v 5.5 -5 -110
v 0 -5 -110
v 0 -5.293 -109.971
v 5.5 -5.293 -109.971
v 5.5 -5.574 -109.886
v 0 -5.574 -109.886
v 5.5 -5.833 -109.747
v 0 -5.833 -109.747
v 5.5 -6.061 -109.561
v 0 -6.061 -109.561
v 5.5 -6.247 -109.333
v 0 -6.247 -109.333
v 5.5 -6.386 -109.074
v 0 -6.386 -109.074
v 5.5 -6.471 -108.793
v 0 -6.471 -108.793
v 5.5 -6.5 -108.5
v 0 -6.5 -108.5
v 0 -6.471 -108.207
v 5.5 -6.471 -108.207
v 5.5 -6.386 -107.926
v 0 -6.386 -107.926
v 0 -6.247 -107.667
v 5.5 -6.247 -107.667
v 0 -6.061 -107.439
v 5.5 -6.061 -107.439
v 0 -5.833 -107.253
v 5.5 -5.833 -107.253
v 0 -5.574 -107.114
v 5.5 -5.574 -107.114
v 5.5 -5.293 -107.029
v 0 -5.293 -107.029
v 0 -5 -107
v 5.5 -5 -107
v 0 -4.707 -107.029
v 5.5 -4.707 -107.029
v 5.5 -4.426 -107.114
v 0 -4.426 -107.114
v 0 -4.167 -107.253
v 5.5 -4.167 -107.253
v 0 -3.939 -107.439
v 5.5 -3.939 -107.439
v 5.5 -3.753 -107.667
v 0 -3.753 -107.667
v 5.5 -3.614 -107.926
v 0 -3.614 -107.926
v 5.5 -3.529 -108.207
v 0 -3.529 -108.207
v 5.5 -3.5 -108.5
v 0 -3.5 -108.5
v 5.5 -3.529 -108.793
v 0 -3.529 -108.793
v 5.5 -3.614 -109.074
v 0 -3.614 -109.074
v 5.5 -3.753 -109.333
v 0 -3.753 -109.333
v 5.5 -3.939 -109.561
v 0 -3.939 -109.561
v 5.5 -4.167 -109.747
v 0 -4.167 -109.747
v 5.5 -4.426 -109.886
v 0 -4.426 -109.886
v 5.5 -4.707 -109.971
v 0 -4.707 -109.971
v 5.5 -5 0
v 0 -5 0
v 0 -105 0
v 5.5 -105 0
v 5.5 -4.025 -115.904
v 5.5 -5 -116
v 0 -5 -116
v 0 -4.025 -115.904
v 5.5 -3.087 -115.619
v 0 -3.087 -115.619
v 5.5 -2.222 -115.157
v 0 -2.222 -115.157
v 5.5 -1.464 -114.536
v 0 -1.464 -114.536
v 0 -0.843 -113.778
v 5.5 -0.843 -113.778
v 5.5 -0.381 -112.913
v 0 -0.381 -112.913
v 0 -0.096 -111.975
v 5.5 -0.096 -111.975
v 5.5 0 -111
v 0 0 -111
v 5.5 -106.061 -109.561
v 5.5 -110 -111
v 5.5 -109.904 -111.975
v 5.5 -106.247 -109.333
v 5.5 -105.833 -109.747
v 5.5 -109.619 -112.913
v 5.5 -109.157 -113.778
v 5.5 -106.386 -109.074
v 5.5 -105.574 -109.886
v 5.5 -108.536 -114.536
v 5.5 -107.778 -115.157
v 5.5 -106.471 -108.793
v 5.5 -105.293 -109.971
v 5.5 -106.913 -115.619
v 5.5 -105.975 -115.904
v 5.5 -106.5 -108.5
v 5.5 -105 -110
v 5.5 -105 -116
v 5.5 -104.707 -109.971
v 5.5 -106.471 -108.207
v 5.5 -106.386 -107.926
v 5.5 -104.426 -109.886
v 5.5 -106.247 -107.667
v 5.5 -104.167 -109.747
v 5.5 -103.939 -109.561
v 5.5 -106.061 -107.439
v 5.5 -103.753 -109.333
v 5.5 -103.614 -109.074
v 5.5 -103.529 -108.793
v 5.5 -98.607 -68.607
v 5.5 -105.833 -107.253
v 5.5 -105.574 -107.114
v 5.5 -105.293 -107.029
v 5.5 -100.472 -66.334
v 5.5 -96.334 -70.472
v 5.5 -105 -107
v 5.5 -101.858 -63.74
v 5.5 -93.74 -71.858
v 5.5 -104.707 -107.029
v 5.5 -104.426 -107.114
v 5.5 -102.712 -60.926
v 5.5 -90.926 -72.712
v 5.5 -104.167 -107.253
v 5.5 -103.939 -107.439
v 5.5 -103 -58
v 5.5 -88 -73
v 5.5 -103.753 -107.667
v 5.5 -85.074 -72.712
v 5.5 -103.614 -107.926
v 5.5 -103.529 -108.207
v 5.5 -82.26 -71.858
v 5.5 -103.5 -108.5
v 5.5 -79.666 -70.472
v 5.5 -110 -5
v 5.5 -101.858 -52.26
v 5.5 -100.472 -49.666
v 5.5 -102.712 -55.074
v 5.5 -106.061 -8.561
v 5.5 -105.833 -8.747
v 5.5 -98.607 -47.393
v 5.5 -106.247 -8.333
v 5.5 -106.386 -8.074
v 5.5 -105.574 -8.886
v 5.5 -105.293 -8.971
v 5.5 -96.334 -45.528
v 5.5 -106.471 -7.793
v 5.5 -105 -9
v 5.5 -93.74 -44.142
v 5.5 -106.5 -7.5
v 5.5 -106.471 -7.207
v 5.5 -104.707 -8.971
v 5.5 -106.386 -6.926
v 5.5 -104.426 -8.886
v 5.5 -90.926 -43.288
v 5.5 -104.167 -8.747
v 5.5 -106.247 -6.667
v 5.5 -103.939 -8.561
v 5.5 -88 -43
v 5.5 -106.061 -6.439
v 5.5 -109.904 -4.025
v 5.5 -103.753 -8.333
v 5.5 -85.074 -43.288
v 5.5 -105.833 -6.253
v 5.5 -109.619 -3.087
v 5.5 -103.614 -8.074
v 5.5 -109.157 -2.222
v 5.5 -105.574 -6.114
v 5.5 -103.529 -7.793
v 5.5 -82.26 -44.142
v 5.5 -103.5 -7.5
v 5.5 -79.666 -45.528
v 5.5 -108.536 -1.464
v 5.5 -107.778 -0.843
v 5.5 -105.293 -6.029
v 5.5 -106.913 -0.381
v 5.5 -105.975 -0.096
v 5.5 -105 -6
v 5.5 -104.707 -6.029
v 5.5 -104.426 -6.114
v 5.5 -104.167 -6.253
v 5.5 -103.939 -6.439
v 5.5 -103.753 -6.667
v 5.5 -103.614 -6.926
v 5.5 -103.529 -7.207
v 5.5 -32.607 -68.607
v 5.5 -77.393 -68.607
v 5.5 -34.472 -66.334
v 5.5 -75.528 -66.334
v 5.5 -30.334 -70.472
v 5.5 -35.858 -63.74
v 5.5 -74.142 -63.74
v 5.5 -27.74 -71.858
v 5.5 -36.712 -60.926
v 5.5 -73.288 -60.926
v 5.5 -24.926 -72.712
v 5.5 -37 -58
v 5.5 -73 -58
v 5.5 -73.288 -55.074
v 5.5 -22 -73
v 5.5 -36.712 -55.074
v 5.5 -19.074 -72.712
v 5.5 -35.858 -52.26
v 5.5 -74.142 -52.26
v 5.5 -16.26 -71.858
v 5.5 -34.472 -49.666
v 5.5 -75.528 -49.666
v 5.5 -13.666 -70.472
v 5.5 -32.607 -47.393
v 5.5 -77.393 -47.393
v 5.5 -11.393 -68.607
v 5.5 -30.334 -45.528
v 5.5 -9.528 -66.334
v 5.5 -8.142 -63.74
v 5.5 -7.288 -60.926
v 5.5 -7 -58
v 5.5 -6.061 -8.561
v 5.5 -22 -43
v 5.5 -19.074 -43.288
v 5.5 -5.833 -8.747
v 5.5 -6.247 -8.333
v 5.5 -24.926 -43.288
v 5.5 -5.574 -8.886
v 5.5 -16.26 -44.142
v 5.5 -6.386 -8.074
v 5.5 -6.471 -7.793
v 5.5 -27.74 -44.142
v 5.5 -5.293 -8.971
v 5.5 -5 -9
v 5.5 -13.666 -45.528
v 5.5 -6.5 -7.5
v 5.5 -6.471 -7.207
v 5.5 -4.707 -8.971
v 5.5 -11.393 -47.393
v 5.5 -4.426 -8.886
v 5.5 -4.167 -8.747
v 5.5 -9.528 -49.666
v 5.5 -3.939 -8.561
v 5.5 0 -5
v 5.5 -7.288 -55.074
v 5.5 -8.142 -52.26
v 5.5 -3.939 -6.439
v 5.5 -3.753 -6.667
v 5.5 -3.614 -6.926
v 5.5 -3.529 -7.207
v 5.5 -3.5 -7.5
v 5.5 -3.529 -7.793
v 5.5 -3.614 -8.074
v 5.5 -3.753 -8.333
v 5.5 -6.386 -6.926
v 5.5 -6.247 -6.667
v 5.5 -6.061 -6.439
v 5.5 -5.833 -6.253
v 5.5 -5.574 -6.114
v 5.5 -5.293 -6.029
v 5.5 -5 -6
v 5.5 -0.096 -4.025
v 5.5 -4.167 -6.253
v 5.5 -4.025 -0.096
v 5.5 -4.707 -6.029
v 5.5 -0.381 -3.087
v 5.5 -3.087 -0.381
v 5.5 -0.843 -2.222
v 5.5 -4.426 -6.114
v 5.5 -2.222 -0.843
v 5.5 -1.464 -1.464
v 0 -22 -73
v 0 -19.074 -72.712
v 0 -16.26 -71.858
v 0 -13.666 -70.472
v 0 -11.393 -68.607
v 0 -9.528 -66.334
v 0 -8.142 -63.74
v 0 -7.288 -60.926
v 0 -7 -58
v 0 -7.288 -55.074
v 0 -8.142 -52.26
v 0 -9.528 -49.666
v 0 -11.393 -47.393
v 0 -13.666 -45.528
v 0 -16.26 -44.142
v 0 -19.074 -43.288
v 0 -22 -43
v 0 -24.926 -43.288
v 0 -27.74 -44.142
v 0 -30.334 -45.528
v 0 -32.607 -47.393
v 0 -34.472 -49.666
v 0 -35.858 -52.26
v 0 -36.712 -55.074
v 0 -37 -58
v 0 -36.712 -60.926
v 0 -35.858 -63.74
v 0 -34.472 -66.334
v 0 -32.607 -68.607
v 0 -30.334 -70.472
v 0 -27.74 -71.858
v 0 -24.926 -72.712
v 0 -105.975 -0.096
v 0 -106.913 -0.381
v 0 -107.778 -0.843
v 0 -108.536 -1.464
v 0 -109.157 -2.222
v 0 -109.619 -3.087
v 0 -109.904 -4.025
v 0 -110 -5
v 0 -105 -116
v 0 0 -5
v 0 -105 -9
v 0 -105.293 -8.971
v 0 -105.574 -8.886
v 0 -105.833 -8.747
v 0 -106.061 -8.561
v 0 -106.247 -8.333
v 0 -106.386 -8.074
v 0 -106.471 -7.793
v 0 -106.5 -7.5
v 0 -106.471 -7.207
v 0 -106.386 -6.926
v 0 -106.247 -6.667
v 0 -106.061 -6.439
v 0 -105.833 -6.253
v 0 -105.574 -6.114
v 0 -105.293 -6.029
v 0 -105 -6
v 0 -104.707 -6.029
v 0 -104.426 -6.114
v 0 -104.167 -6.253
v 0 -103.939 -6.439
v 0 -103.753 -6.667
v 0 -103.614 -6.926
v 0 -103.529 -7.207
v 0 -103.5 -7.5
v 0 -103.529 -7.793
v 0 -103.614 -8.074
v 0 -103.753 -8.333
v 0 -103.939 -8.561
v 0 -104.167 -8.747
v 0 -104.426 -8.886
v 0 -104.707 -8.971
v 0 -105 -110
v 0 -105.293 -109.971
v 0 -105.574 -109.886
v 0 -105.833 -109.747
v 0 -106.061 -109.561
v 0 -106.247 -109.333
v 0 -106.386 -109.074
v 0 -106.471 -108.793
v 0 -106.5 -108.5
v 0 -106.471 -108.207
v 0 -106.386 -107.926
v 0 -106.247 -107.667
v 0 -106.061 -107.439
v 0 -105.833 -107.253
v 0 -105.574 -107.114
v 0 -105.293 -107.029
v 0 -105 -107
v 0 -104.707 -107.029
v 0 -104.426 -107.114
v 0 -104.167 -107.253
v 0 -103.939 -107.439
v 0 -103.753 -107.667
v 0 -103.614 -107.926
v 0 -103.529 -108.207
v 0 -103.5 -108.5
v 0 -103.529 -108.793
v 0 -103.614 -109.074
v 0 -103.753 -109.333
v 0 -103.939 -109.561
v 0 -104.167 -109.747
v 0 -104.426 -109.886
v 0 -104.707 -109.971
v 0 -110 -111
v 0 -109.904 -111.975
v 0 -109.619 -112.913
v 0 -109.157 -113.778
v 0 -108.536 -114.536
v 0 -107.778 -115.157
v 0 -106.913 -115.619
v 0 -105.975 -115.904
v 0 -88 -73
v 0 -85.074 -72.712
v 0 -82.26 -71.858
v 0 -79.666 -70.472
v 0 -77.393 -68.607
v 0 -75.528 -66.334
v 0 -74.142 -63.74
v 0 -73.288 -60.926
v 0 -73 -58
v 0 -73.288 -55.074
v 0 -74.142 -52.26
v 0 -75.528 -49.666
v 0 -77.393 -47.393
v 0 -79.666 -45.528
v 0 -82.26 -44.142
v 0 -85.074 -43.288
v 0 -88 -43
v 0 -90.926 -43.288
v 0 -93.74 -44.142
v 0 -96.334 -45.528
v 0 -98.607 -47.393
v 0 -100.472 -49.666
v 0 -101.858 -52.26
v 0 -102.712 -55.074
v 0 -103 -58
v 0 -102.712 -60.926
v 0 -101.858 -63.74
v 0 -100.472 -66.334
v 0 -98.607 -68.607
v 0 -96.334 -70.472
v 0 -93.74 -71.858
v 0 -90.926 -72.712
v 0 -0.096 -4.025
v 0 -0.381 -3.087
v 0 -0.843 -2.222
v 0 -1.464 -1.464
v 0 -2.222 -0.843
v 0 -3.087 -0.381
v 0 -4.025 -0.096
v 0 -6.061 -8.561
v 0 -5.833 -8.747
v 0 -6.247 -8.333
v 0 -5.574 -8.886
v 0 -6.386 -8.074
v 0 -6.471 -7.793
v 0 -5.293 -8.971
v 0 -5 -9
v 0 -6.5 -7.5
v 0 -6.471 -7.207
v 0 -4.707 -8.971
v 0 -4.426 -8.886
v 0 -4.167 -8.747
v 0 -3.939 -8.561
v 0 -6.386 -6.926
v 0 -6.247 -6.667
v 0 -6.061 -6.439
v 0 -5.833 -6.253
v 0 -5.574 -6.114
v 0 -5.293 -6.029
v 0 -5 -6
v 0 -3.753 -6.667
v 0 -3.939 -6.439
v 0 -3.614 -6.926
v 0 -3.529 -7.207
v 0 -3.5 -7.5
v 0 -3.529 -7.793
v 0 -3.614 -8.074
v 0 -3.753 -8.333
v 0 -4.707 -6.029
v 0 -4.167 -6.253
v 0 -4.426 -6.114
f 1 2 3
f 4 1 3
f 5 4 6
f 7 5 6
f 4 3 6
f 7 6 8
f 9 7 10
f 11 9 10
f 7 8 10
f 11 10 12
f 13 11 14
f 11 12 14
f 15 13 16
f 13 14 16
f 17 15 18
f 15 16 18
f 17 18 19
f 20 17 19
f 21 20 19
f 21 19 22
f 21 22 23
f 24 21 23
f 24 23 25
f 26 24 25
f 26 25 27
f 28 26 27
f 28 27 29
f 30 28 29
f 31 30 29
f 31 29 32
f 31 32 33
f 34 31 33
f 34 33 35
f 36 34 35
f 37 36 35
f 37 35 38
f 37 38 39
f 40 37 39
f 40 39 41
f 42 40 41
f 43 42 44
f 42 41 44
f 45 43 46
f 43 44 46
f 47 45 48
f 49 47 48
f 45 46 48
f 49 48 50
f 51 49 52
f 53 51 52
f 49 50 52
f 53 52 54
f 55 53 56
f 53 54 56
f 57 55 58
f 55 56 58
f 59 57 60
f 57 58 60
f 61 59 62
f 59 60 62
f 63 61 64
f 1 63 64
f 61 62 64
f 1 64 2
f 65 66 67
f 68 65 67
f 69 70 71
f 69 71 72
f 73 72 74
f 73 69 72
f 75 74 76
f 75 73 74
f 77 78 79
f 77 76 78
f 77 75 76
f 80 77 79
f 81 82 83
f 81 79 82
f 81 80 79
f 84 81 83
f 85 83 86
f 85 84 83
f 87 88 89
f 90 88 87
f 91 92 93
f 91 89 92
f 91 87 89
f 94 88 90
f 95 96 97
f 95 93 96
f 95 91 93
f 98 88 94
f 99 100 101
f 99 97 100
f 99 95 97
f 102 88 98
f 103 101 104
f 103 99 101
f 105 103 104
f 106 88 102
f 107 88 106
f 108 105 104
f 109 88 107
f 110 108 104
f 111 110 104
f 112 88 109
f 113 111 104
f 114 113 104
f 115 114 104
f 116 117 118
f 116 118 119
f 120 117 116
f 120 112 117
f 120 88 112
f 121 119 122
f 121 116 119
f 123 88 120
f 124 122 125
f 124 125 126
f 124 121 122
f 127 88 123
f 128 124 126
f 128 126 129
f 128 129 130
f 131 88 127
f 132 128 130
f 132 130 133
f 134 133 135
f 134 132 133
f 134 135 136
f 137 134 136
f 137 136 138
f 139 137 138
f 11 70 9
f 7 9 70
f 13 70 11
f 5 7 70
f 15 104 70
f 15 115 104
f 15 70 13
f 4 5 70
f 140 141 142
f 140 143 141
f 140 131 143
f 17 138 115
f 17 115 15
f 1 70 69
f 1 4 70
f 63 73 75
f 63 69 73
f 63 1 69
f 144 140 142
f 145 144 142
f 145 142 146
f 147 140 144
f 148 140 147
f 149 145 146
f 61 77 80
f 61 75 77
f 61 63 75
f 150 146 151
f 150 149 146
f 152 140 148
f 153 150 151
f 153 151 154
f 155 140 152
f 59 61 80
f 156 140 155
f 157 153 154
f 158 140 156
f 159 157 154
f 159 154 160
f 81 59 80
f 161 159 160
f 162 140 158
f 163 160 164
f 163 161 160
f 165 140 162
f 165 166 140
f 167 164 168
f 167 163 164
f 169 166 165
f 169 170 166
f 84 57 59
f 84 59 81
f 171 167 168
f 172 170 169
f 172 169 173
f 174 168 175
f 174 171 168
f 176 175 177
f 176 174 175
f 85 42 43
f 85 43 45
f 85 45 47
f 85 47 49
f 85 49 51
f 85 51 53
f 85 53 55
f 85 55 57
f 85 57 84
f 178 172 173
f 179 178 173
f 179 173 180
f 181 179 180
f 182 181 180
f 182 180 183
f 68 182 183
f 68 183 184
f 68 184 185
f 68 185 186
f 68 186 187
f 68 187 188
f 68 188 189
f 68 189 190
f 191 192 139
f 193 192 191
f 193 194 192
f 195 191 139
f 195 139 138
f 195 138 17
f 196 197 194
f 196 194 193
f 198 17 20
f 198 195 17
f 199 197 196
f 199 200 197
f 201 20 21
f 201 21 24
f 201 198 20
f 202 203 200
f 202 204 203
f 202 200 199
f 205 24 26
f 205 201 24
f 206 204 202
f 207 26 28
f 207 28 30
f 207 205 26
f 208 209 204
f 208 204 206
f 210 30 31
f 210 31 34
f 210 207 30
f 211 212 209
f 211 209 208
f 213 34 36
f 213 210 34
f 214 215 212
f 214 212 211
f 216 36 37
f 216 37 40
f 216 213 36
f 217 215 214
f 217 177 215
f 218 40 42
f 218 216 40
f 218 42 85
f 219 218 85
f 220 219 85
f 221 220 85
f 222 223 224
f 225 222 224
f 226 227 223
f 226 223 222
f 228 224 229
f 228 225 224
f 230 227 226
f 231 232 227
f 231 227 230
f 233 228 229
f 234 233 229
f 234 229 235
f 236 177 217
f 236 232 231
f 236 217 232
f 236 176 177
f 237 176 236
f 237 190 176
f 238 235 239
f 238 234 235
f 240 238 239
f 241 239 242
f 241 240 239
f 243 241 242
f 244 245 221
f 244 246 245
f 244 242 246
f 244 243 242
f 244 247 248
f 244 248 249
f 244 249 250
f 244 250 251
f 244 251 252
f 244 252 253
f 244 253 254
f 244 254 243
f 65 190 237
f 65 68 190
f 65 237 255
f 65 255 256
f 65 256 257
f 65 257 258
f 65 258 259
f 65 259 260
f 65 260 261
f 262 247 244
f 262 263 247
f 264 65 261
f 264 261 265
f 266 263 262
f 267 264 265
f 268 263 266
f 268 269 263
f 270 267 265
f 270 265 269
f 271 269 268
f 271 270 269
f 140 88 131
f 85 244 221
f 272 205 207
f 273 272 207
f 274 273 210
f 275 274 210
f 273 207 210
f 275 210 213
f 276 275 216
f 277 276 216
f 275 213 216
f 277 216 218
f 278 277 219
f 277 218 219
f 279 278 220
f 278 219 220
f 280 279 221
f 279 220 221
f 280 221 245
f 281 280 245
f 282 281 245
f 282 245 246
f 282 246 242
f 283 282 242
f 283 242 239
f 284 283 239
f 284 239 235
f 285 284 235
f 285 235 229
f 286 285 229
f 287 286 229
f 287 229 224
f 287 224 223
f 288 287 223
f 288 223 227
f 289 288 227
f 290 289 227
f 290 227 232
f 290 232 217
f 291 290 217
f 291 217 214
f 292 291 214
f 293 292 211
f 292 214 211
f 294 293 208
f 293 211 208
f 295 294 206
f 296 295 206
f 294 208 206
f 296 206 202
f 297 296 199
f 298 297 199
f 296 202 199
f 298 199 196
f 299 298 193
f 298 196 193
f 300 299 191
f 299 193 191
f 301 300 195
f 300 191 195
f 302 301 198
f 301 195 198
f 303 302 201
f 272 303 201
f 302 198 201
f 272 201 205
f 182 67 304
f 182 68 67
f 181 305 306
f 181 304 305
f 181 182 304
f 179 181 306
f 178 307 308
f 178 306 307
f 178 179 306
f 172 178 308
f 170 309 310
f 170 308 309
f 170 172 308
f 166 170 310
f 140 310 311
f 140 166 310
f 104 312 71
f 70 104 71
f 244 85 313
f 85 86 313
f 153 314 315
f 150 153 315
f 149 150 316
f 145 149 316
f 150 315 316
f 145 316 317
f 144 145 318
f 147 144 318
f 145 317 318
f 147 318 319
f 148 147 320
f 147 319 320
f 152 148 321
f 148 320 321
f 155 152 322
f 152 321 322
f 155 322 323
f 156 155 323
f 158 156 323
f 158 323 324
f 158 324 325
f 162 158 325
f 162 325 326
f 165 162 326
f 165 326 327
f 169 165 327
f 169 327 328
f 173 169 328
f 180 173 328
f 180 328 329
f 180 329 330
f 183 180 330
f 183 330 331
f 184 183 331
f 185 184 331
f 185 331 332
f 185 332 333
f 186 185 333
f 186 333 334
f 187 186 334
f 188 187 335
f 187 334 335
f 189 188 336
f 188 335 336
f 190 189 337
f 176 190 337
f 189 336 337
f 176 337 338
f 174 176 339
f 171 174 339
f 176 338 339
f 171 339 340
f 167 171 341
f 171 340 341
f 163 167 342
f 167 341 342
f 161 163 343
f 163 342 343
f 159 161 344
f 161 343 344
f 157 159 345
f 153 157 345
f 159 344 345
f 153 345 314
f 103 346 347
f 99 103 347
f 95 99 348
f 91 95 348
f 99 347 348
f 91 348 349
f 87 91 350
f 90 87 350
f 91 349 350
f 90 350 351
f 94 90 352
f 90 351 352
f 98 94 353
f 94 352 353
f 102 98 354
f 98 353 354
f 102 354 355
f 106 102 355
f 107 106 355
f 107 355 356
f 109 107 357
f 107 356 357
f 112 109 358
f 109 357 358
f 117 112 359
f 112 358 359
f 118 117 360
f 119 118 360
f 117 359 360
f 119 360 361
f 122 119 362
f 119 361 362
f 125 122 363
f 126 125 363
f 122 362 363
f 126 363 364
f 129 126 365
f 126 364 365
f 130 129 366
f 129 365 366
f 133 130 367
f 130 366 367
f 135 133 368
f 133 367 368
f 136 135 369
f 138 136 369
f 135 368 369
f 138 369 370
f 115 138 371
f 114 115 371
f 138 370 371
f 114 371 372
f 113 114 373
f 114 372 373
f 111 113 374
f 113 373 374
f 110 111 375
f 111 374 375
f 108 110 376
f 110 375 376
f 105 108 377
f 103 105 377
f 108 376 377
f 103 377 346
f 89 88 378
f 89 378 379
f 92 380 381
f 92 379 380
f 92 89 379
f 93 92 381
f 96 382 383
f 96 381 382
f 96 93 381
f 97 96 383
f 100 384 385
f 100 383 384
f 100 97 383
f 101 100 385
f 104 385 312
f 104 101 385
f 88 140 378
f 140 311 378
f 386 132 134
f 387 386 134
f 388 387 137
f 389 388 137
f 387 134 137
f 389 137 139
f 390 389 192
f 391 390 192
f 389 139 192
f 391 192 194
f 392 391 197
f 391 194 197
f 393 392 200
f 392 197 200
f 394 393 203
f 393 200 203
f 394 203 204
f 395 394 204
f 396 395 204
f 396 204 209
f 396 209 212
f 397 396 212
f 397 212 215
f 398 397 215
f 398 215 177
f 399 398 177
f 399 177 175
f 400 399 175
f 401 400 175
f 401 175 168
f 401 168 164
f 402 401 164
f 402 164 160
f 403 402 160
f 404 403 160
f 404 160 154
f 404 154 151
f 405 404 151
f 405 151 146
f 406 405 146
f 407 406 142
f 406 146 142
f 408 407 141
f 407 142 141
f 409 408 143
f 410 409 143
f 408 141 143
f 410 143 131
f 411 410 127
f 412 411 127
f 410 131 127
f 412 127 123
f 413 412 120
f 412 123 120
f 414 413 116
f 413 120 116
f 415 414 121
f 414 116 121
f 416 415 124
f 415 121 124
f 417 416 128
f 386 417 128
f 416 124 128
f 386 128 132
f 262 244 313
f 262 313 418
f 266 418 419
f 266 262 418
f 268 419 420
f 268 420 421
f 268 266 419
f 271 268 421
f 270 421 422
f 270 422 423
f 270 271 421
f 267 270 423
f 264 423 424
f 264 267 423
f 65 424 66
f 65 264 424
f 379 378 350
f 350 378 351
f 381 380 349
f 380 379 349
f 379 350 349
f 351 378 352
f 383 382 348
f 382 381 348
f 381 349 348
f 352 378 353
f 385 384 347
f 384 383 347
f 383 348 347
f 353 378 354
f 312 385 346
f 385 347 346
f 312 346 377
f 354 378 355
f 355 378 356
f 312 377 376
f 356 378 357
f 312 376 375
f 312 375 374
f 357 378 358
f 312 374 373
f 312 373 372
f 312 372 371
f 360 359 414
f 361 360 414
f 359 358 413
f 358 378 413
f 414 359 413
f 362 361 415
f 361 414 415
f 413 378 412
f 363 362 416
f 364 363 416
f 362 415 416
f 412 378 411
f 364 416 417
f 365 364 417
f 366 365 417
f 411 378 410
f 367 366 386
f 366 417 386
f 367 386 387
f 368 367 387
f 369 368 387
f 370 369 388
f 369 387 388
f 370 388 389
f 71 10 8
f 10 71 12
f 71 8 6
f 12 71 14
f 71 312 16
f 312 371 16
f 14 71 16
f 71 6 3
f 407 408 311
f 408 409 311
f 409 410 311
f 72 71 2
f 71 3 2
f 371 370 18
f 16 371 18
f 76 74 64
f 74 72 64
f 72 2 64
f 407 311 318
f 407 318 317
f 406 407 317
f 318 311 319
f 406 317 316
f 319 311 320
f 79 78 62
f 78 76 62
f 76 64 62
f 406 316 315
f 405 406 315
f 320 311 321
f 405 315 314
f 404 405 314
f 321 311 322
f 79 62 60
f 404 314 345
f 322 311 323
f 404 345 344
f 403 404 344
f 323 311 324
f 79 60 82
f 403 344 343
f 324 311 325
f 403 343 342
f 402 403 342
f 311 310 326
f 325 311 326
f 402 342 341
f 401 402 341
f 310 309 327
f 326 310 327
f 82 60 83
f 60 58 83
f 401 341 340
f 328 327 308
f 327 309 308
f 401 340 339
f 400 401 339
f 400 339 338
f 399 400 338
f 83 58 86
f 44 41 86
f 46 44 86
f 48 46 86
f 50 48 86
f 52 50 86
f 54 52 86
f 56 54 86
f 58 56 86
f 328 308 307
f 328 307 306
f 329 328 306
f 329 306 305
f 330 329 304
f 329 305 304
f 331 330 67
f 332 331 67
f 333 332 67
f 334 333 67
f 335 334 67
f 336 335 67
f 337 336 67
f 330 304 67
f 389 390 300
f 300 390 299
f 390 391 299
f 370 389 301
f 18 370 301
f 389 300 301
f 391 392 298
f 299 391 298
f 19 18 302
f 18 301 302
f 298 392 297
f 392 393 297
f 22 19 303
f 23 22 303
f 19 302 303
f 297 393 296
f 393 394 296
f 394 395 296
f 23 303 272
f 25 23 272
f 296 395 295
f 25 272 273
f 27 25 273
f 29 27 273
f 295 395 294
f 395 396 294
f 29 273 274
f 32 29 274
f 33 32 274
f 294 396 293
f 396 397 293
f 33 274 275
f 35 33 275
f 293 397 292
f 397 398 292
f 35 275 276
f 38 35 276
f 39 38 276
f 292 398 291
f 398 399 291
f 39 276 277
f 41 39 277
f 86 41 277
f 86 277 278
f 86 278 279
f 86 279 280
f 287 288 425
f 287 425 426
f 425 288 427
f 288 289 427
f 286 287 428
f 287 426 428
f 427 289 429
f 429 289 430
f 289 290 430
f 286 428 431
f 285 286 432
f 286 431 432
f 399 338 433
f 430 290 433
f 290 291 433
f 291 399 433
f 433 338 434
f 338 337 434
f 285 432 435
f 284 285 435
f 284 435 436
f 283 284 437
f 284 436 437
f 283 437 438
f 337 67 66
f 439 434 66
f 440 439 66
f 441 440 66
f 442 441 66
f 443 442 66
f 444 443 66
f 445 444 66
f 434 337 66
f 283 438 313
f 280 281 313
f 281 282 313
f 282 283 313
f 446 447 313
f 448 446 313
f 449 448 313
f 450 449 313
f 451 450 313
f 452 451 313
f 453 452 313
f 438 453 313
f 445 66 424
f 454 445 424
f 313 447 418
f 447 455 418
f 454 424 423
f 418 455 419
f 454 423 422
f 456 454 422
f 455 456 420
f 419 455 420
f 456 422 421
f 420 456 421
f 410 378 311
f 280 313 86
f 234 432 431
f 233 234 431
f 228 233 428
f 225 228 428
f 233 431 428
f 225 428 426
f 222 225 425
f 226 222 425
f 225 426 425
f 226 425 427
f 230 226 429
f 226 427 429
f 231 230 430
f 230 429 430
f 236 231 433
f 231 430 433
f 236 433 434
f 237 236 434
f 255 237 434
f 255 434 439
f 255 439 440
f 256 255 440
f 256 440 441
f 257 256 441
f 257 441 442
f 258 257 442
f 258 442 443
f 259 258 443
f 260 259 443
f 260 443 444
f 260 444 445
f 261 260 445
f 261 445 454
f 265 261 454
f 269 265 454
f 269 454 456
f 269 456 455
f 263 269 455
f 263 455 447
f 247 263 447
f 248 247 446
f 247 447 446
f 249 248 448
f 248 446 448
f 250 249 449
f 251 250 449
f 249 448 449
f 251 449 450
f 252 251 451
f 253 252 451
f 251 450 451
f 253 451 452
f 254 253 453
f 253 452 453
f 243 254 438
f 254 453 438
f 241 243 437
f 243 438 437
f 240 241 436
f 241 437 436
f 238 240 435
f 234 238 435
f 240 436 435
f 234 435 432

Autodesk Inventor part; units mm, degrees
ref_plane "YZ Plane" through (0, 0, 0) normal (1, 0, 0) x (0, 1, 0)
ref_plane "XZ Plane" through (0, 0, 0) normal (0, 1, 0) x (-1, 0, 0)
ref_plane "XY Plane" through (0, 0, 0) normal (0, 0, 1) x (1, 0, 0)
sketch "スケッチ1" plane through (0, 0, 0) normal (1, 0, 0) x (0, 1, 0)
  line L0 (0, 0) -> (-110, 0)
  line L1 (-110, 0) -> (-110, -116)
  line L2 (-110, -116) -> (0, -116)
  line L3 (0, -116) -> (0, 0)
  dimension "d0" = 110
  dimension "d1" = 116
extrude "押し出し1" add sketch "スケッチ1" along normal blind 5.5
fillet "フィレット1" radius 5 4 edges at (2.75, 0, 0) (2.75, 0, -116) (2.75, -110, 0) (2.75, -110, -116)
sketch "スケッチ2" plane through (5.5, 0, 0) normal (1, 0, 0) x (0, 0, -1)
  line L0 (7.5, -5) -> (108.5, -5)
  line L1 (108.5, -5) -> (108.5, -105)
  line L2 (108.5, -105) -> (7.5, -105)
  line L3 (7.5, -105) -> (7.5, -5)
  line L4 (111, 0) -> (5, 0) projected
  line L5 (0, -5) -> (0, -105) projected
  point P0 (0, 0)
  dimension "d5" = 101
  dimension "d6" = 100
  dimension "d7" = 5
  dimension "d8" = 7.5
hole "穴1" at (5.5, -5, -7.5) at (5.5, -5, -108.5) at (5.5, -105, -108.5) at (5.5, -105, -7.5) direction (-1, 0, 0) diameter 3 end through all
sketch "スケッチ3" plane through (5.5, 0, 0) normal (1, 0, 0) x (0, 0, -1)
  circle A0 centre (58, -88) radius 15
  line L0 (0, -5) -> (0, -105) projected
  line L1 (5, -110) -> (111, -110) projected
  point P0 (0, 0)
  dimension "d16" = 30
  dimension "d17" = 58
  dimension "d18" = 22
extrude "押し出し2" cut sketch "スケッチ3" against normal through all
sketch "スケッチ4" plane through (5.5, 0, 0) normal (1, 0, 0) x (0, 0, -1)
  circle A0 centre (58, -22) radius 15
  line L0 (111, 0) -> (5, 0) projected
  circle A1 centre (58, -88) radius 15 projected
  line L1 (0, -5) -> (0, -105) projected
  point P0 (0, 0)
  dimension "d21" = 30
  dimension "d22" = 22
  dimension "d23" = 58
  dimension "d24" = 58
sketch "スケッチ5" plane through (5.5, 0, 0) normal (1, 0, 0) x (0, 0, -1)
  point P0 (0, 0)
extrude "押し出し3" cut sketch "スケッチ4" against normal through all contours A0
equation "\"d24\" = d23"
properties part number "ロボットベースT5.5_2" material "木材 (オーク)"
